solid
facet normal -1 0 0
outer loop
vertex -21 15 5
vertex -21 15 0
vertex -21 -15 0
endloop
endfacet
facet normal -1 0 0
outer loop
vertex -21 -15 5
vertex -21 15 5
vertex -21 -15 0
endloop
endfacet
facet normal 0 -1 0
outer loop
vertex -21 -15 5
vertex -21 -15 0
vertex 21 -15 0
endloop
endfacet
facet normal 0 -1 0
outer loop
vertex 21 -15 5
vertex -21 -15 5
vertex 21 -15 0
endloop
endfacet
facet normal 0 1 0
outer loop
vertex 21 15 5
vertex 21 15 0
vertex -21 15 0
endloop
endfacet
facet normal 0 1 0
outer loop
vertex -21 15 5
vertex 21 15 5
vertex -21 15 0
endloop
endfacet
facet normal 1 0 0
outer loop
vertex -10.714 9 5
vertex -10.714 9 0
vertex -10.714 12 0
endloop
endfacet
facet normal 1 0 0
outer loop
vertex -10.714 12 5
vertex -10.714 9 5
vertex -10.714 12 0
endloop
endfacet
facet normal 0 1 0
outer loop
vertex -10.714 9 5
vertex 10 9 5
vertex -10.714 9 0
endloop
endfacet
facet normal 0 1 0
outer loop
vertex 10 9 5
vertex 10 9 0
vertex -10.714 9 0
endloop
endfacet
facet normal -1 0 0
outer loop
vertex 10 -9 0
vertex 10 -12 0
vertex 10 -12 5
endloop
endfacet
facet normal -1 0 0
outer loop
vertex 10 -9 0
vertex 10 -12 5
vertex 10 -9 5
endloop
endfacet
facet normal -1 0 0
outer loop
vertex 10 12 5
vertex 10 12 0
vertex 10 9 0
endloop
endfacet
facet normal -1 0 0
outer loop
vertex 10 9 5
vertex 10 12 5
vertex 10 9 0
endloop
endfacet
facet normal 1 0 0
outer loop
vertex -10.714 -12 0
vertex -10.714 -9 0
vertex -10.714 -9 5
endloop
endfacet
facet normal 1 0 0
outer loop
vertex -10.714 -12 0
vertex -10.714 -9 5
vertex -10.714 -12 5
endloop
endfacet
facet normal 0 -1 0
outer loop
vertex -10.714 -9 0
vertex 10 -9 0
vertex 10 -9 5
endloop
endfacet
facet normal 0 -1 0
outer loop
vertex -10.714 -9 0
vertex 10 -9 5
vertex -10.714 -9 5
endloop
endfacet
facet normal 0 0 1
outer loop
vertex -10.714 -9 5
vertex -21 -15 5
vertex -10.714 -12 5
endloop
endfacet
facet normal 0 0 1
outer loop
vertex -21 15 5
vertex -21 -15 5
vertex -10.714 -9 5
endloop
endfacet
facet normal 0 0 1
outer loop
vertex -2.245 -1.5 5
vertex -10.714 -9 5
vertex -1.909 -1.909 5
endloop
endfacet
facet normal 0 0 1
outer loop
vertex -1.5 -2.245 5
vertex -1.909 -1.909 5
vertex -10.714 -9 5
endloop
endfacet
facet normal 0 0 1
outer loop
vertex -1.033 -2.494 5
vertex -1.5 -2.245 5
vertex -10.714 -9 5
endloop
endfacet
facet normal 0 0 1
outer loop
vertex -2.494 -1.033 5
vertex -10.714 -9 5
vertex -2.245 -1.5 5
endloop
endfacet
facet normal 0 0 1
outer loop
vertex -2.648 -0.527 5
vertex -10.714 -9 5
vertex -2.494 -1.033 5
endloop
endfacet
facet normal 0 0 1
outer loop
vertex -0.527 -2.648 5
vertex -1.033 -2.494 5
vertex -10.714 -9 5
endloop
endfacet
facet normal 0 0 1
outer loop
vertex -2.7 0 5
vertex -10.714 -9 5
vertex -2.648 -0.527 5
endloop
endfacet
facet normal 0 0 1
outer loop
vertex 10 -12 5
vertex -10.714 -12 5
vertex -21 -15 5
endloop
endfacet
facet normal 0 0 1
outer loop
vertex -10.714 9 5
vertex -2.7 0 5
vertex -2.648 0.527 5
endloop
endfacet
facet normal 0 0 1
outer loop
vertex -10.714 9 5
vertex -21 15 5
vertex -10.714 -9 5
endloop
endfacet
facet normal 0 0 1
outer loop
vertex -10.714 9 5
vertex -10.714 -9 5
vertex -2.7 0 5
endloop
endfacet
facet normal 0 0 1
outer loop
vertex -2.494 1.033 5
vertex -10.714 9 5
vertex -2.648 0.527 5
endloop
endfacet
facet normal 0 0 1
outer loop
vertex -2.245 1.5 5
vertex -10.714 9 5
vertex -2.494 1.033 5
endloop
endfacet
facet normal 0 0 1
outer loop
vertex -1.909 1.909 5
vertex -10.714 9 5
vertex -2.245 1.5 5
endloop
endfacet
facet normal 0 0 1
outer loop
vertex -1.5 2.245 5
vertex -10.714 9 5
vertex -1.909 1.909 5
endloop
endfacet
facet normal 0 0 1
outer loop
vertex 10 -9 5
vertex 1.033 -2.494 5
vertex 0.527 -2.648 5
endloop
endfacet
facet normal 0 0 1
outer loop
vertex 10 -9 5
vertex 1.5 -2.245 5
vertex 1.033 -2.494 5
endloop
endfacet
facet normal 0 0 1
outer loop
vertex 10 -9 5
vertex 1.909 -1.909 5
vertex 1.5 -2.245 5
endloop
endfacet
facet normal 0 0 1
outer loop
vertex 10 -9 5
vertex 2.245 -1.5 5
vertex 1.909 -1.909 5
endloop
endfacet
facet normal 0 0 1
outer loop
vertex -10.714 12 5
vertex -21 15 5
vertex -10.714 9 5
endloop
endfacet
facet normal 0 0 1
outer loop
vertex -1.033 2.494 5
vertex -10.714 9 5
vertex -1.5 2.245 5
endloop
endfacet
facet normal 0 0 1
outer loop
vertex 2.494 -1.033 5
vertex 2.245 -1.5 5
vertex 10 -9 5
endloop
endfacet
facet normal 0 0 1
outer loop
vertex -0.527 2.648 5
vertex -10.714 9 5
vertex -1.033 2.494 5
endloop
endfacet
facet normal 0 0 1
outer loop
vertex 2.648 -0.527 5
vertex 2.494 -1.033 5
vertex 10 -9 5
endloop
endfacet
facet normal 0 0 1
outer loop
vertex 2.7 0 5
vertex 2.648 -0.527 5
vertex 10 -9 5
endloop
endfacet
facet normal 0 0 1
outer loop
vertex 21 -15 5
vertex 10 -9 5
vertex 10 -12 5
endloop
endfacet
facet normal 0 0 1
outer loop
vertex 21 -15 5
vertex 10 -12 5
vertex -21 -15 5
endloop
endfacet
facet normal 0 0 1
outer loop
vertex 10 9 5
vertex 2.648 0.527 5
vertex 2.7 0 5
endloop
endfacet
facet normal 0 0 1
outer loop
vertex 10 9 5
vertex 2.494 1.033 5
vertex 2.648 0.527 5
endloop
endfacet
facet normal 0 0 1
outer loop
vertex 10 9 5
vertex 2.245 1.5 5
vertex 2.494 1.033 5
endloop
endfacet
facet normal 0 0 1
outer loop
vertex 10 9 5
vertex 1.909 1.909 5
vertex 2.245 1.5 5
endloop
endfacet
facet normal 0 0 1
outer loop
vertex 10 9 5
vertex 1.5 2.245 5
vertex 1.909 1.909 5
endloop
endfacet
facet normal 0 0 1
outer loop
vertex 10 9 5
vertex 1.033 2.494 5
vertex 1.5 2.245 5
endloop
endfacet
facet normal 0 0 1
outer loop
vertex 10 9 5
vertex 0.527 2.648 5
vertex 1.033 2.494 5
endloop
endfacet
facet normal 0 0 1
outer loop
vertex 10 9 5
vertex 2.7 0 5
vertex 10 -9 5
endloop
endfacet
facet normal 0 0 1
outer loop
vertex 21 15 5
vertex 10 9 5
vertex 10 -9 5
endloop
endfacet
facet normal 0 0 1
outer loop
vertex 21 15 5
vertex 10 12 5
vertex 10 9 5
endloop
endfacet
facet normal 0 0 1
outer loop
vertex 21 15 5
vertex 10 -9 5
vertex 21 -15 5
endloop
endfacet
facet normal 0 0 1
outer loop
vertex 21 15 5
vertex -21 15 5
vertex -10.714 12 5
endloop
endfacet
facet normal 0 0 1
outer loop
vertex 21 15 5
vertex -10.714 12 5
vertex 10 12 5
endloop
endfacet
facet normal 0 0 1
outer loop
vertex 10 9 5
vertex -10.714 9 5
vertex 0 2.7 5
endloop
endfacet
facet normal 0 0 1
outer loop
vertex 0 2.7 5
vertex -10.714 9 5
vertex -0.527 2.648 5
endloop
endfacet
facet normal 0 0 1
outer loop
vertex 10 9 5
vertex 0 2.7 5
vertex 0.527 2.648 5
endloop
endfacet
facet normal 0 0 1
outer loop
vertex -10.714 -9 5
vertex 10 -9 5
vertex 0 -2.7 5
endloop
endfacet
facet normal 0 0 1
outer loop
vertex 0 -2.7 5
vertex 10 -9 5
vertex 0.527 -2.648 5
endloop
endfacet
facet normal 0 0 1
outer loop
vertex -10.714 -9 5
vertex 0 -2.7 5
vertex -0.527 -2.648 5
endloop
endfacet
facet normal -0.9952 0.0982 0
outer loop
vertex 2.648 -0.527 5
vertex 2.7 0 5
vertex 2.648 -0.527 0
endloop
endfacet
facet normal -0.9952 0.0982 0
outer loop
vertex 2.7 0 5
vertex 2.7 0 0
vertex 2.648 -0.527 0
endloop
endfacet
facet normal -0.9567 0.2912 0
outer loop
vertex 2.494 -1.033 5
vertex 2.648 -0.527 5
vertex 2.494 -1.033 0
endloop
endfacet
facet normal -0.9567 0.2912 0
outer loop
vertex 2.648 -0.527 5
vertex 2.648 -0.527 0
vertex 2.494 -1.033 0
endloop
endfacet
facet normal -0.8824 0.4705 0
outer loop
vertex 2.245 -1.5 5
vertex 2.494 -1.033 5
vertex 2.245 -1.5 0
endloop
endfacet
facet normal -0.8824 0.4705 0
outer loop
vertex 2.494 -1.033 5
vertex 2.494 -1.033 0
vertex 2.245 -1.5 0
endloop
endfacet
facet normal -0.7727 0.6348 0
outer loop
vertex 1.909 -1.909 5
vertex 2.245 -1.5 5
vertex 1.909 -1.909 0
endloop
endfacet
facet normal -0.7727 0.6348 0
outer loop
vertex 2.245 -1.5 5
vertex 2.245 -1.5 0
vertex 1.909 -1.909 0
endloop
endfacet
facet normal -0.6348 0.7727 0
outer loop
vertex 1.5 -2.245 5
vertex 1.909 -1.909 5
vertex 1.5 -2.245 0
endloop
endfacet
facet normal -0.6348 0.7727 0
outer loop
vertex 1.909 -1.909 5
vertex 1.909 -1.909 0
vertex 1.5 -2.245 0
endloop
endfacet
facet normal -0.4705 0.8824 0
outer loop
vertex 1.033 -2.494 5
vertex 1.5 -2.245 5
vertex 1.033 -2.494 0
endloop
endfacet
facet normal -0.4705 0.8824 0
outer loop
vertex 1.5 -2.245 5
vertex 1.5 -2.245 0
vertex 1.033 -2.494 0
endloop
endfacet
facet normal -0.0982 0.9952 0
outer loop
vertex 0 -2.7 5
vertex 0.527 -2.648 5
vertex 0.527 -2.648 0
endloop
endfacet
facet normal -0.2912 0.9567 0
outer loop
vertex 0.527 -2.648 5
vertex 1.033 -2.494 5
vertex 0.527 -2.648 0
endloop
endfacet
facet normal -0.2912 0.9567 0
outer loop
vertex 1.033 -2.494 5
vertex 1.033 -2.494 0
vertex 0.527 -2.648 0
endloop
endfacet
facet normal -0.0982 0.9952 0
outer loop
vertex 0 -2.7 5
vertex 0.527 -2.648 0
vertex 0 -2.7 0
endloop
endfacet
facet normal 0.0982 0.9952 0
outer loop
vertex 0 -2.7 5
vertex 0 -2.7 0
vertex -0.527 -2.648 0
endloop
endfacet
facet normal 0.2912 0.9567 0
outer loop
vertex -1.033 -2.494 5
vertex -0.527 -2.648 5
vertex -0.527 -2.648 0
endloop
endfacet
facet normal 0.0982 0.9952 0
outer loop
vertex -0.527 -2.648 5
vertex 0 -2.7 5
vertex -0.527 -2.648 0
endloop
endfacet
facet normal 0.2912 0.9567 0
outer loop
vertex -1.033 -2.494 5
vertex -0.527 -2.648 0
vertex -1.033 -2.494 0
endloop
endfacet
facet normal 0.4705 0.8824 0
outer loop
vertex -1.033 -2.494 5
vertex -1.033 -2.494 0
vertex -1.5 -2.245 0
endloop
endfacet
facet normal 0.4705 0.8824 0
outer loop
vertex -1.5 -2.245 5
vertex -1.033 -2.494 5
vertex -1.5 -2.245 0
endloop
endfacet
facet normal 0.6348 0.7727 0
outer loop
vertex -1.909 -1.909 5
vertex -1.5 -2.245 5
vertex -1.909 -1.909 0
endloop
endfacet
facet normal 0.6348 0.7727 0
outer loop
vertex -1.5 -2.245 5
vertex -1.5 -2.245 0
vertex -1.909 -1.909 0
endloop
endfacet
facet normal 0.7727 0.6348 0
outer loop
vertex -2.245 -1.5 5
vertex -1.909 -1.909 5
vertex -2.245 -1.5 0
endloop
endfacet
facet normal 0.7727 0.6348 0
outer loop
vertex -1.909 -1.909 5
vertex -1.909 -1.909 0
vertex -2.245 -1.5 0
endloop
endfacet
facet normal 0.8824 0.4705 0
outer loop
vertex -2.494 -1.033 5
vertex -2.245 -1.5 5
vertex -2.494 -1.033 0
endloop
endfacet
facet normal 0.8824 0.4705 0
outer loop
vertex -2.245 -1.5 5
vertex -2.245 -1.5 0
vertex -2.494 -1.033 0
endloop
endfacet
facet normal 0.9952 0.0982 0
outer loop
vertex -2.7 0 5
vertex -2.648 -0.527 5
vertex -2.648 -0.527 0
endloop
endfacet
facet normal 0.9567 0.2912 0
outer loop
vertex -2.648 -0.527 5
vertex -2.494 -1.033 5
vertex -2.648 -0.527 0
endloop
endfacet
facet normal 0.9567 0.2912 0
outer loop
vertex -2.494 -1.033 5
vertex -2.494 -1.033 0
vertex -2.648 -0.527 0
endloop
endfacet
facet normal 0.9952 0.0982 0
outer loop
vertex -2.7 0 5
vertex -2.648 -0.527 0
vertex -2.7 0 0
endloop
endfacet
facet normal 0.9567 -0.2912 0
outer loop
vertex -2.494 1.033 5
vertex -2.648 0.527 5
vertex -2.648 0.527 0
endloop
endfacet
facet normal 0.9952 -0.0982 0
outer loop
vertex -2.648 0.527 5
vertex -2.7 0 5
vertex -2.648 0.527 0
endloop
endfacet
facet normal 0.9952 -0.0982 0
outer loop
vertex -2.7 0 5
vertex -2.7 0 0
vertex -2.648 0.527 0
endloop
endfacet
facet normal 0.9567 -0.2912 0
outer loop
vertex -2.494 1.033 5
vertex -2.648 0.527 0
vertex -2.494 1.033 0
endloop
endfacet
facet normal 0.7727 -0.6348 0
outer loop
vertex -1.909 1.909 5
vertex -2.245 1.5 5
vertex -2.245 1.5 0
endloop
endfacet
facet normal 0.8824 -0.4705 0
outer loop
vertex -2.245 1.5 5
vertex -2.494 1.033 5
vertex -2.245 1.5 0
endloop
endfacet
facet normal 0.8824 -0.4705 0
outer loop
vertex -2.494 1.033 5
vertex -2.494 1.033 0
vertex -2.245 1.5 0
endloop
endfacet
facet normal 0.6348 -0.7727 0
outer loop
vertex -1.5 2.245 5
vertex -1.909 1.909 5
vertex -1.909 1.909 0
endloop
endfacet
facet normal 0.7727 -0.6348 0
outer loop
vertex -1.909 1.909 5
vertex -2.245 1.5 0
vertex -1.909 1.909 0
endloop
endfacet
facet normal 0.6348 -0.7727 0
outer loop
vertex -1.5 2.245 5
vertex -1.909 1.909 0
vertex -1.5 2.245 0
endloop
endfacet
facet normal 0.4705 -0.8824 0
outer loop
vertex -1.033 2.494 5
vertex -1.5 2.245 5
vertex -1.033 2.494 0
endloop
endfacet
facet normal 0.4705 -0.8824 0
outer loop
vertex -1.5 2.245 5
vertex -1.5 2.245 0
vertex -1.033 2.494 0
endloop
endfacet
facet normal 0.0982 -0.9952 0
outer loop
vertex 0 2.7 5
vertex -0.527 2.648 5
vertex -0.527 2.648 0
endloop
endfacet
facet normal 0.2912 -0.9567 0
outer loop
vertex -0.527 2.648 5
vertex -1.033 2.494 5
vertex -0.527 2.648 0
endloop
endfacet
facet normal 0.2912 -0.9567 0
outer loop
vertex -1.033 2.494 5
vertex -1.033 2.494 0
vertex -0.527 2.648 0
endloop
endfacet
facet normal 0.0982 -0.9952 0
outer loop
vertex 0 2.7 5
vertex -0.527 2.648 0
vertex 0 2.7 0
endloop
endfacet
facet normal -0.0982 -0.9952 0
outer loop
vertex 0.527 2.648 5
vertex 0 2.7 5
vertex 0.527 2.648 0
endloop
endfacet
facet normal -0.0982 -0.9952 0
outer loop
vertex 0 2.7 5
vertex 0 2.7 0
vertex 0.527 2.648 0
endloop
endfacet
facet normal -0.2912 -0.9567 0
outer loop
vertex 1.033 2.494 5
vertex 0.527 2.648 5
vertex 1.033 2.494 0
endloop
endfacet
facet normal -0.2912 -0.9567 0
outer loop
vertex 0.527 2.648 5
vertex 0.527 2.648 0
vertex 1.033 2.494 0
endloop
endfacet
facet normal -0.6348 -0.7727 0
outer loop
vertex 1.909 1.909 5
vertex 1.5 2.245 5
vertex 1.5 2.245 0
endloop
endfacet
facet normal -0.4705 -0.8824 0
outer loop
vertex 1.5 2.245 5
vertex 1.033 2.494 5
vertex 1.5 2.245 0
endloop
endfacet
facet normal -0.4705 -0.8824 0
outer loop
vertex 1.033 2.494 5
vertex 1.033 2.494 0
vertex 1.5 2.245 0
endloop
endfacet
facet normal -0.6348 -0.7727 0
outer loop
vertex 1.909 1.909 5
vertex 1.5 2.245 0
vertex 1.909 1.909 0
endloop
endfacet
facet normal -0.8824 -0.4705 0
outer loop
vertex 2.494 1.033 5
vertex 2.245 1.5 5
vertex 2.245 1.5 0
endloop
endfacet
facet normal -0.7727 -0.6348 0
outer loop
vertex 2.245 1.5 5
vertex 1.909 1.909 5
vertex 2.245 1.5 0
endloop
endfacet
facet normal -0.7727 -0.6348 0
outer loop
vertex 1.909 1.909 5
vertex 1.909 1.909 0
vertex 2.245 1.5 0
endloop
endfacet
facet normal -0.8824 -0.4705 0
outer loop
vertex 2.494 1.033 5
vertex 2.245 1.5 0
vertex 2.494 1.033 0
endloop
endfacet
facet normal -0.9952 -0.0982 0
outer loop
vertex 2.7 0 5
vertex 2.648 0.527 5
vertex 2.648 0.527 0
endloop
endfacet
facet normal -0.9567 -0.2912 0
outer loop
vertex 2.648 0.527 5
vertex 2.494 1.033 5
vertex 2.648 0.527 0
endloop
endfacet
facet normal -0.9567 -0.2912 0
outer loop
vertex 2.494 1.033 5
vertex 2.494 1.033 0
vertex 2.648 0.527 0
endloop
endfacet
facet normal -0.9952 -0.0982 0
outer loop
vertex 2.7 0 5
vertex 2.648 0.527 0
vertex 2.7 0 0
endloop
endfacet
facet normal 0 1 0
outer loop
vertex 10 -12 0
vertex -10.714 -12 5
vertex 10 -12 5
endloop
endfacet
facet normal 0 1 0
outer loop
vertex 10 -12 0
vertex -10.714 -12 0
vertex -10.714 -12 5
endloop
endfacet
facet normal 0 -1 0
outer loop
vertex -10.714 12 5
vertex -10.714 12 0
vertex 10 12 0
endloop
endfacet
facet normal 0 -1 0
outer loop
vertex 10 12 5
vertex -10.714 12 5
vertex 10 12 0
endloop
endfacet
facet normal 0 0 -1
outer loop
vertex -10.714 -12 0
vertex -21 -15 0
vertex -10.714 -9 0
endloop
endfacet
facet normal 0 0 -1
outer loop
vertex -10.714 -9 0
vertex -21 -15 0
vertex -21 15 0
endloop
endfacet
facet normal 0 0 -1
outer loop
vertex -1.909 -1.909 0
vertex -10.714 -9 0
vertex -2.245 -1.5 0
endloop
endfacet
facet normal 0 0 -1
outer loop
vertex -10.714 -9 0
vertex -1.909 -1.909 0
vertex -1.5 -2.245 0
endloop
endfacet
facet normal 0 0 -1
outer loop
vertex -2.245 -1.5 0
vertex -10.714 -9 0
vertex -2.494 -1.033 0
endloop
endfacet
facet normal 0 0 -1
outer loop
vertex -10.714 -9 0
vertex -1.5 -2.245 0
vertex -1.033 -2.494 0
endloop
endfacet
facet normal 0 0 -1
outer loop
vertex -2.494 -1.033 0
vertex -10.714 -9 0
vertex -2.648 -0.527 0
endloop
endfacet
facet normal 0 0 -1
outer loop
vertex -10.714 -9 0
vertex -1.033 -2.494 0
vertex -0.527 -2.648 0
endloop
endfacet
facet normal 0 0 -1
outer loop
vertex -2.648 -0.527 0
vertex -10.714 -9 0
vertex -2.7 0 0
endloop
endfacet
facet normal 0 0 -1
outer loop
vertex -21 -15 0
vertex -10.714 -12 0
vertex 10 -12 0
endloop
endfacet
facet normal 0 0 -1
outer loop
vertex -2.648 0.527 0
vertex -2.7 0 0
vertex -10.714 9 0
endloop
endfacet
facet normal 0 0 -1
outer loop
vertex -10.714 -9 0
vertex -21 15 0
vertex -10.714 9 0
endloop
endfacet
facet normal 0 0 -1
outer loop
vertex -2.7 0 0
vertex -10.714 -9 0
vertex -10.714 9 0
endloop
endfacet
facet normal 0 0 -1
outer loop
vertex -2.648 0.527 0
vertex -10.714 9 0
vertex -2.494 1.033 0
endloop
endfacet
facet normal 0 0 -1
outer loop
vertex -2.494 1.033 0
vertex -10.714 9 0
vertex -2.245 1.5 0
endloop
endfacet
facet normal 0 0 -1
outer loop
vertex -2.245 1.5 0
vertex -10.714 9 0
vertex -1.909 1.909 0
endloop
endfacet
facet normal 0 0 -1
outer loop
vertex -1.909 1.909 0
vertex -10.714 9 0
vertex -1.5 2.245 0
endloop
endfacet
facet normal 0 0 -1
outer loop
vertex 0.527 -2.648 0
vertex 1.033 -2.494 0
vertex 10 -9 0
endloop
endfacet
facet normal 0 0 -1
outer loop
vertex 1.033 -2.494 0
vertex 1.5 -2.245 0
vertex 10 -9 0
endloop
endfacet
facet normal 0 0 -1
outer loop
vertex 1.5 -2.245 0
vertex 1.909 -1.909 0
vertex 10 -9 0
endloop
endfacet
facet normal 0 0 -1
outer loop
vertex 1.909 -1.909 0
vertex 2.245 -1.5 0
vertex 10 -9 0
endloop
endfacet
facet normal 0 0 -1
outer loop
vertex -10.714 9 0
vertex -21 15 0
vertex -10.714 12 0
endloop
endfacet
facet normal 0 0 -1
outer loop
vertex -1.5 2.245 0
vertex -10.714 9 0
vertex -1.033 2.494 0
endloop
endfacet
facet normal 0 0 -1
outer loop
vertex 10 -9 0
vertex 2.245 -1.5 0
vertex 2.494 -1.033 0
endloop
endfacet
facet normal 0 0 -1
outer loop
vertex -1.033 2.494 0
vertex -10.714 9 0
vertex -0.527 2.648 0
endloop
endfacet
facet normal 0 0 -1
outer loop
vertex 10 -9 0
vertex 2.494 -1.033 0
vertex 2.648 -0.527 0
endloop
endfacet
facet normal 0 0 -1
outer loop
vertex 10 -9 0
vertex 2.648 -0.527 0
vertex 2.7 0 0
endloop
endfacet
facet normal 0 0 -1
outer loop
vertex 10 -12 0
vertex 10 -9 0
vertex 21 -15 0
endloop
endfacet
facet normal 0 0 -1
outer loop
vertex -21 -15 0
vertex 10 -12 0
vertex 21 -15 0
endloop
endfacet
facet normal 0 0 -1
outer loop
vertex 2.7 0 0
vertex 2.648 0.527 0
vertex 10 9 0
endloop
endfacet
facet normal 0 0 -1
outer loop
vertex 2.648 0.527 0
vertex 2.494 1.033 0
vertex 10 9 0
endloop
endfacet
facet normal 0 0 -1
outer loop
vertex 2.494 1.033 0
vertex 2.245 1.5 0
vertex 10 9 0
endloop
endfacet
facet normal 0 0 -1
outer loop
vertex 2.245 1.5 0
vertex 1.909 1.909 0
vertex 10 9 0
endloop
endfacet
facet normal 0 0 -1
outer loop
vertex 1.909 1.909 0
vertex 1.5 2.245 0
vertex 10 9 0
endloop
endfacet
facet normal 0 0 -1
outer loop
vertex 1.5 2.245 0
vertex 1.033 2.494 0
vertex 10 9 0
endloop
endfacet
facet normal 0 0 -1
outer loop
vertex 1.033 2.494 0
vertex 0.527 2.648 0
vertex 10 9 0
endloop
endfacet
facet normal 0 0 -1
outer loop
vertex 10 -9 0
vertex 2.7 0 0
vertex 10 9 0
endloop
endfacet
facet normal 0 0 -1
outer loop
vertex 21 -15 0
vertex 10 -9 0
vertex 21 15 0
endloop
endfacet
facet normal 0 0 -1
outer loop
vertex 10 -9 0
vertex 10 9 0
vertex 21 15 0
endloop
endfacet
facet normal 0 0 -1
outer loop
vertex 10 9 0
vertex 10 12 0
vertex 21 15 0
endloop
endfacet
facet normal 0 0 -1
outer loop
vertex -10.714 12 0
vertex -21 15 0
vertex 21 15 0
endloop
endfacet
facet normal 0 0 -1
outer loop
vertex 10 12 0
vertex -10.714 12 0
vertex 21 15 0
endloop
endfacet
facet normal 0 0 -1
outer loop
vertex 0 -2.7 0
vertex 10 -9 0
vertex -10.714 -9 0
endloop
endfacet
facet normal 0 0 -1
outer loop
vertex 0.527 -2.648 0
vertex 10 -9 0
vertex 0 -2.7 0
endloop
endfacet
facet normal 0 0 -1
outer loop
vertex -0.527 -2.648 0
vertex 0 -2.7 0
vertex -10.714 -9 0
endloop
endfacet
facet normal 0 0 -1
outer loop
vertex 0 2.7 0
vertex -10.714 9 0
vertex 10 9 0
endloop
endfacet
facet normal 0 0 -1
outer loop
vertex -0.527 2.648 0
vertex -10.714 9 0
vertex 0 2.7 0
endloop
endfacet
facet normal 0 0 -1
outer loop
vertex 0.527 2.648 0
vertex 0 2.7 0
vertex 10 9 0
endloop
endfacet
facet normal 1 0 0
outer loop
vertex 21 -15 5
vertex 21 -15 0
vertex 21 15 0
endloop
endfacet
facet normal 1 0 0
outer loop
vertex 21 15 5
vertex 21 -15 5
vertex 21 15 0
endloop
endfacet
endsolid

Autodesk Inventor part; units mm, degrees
ref_plane "YZ Plane" through (0, 0, 0) normal (1, 0, 0) x (0, 1, 0)
ref_plane "XZ Plane" through (0, 0, 0) normal (0, 1, 0) x (-1, 0, 0)
ref_plane "XY Plane" through (0, 0, 0) normal (0, 0, 1) x (1, 0, 0)
sketch "Эскиз1" plane through (0, 0, 0) normal (0, 0, 1) x (1, 0, 0)
  line L0 (-21, -15) -> (21, -15)
  line L1 (21, -15) -> (21, 15)
  line L2 (21, 15) -> (-21, 15)
  line L3 (-21, 15) -> (-21, -15)
  line L4 (-21, -15) -> (21, 15) construction
  line L5 (21, -15) -> (-21, 15) construction
  circle A0 centre (0, 0) radius 2.7
  line L6 (-10.7143, 15) -> (-10.7143, 12) construction
  line L7 (10.7143, 15) -> (10.7143, 13) construction
  line L8 (-10.7143, 12) -> (10, 12)
  line L9 (10, 12) -> (10, 9)
  line L10 (10, 9) -> (-10.7143, 9)
  line L11 (-10.7143, 9) -> (-10.7143, 12)
  line L12 (-21, 0) -> (21, 0) construction
  line L13 (-10.7143, -12) -> (10, -12)
  line L14 (10, -12) -> (10, -9)
  line L15 (-10.7143, -9) -> (-10.7143, -12)
  line L16 (10, -9) -> (-10.7143, -9)
  dimension "d0" = 42
  dimension "d1" = 30
  dimension "d2" = 5.4
  dimension "d3" = 3
  dimension "d4" = 2
  dimension "d5" = 3
extrude "Выдавливание1" add sketch "Эскиз1" along normal blind 5
properties part number "Female for pack"
